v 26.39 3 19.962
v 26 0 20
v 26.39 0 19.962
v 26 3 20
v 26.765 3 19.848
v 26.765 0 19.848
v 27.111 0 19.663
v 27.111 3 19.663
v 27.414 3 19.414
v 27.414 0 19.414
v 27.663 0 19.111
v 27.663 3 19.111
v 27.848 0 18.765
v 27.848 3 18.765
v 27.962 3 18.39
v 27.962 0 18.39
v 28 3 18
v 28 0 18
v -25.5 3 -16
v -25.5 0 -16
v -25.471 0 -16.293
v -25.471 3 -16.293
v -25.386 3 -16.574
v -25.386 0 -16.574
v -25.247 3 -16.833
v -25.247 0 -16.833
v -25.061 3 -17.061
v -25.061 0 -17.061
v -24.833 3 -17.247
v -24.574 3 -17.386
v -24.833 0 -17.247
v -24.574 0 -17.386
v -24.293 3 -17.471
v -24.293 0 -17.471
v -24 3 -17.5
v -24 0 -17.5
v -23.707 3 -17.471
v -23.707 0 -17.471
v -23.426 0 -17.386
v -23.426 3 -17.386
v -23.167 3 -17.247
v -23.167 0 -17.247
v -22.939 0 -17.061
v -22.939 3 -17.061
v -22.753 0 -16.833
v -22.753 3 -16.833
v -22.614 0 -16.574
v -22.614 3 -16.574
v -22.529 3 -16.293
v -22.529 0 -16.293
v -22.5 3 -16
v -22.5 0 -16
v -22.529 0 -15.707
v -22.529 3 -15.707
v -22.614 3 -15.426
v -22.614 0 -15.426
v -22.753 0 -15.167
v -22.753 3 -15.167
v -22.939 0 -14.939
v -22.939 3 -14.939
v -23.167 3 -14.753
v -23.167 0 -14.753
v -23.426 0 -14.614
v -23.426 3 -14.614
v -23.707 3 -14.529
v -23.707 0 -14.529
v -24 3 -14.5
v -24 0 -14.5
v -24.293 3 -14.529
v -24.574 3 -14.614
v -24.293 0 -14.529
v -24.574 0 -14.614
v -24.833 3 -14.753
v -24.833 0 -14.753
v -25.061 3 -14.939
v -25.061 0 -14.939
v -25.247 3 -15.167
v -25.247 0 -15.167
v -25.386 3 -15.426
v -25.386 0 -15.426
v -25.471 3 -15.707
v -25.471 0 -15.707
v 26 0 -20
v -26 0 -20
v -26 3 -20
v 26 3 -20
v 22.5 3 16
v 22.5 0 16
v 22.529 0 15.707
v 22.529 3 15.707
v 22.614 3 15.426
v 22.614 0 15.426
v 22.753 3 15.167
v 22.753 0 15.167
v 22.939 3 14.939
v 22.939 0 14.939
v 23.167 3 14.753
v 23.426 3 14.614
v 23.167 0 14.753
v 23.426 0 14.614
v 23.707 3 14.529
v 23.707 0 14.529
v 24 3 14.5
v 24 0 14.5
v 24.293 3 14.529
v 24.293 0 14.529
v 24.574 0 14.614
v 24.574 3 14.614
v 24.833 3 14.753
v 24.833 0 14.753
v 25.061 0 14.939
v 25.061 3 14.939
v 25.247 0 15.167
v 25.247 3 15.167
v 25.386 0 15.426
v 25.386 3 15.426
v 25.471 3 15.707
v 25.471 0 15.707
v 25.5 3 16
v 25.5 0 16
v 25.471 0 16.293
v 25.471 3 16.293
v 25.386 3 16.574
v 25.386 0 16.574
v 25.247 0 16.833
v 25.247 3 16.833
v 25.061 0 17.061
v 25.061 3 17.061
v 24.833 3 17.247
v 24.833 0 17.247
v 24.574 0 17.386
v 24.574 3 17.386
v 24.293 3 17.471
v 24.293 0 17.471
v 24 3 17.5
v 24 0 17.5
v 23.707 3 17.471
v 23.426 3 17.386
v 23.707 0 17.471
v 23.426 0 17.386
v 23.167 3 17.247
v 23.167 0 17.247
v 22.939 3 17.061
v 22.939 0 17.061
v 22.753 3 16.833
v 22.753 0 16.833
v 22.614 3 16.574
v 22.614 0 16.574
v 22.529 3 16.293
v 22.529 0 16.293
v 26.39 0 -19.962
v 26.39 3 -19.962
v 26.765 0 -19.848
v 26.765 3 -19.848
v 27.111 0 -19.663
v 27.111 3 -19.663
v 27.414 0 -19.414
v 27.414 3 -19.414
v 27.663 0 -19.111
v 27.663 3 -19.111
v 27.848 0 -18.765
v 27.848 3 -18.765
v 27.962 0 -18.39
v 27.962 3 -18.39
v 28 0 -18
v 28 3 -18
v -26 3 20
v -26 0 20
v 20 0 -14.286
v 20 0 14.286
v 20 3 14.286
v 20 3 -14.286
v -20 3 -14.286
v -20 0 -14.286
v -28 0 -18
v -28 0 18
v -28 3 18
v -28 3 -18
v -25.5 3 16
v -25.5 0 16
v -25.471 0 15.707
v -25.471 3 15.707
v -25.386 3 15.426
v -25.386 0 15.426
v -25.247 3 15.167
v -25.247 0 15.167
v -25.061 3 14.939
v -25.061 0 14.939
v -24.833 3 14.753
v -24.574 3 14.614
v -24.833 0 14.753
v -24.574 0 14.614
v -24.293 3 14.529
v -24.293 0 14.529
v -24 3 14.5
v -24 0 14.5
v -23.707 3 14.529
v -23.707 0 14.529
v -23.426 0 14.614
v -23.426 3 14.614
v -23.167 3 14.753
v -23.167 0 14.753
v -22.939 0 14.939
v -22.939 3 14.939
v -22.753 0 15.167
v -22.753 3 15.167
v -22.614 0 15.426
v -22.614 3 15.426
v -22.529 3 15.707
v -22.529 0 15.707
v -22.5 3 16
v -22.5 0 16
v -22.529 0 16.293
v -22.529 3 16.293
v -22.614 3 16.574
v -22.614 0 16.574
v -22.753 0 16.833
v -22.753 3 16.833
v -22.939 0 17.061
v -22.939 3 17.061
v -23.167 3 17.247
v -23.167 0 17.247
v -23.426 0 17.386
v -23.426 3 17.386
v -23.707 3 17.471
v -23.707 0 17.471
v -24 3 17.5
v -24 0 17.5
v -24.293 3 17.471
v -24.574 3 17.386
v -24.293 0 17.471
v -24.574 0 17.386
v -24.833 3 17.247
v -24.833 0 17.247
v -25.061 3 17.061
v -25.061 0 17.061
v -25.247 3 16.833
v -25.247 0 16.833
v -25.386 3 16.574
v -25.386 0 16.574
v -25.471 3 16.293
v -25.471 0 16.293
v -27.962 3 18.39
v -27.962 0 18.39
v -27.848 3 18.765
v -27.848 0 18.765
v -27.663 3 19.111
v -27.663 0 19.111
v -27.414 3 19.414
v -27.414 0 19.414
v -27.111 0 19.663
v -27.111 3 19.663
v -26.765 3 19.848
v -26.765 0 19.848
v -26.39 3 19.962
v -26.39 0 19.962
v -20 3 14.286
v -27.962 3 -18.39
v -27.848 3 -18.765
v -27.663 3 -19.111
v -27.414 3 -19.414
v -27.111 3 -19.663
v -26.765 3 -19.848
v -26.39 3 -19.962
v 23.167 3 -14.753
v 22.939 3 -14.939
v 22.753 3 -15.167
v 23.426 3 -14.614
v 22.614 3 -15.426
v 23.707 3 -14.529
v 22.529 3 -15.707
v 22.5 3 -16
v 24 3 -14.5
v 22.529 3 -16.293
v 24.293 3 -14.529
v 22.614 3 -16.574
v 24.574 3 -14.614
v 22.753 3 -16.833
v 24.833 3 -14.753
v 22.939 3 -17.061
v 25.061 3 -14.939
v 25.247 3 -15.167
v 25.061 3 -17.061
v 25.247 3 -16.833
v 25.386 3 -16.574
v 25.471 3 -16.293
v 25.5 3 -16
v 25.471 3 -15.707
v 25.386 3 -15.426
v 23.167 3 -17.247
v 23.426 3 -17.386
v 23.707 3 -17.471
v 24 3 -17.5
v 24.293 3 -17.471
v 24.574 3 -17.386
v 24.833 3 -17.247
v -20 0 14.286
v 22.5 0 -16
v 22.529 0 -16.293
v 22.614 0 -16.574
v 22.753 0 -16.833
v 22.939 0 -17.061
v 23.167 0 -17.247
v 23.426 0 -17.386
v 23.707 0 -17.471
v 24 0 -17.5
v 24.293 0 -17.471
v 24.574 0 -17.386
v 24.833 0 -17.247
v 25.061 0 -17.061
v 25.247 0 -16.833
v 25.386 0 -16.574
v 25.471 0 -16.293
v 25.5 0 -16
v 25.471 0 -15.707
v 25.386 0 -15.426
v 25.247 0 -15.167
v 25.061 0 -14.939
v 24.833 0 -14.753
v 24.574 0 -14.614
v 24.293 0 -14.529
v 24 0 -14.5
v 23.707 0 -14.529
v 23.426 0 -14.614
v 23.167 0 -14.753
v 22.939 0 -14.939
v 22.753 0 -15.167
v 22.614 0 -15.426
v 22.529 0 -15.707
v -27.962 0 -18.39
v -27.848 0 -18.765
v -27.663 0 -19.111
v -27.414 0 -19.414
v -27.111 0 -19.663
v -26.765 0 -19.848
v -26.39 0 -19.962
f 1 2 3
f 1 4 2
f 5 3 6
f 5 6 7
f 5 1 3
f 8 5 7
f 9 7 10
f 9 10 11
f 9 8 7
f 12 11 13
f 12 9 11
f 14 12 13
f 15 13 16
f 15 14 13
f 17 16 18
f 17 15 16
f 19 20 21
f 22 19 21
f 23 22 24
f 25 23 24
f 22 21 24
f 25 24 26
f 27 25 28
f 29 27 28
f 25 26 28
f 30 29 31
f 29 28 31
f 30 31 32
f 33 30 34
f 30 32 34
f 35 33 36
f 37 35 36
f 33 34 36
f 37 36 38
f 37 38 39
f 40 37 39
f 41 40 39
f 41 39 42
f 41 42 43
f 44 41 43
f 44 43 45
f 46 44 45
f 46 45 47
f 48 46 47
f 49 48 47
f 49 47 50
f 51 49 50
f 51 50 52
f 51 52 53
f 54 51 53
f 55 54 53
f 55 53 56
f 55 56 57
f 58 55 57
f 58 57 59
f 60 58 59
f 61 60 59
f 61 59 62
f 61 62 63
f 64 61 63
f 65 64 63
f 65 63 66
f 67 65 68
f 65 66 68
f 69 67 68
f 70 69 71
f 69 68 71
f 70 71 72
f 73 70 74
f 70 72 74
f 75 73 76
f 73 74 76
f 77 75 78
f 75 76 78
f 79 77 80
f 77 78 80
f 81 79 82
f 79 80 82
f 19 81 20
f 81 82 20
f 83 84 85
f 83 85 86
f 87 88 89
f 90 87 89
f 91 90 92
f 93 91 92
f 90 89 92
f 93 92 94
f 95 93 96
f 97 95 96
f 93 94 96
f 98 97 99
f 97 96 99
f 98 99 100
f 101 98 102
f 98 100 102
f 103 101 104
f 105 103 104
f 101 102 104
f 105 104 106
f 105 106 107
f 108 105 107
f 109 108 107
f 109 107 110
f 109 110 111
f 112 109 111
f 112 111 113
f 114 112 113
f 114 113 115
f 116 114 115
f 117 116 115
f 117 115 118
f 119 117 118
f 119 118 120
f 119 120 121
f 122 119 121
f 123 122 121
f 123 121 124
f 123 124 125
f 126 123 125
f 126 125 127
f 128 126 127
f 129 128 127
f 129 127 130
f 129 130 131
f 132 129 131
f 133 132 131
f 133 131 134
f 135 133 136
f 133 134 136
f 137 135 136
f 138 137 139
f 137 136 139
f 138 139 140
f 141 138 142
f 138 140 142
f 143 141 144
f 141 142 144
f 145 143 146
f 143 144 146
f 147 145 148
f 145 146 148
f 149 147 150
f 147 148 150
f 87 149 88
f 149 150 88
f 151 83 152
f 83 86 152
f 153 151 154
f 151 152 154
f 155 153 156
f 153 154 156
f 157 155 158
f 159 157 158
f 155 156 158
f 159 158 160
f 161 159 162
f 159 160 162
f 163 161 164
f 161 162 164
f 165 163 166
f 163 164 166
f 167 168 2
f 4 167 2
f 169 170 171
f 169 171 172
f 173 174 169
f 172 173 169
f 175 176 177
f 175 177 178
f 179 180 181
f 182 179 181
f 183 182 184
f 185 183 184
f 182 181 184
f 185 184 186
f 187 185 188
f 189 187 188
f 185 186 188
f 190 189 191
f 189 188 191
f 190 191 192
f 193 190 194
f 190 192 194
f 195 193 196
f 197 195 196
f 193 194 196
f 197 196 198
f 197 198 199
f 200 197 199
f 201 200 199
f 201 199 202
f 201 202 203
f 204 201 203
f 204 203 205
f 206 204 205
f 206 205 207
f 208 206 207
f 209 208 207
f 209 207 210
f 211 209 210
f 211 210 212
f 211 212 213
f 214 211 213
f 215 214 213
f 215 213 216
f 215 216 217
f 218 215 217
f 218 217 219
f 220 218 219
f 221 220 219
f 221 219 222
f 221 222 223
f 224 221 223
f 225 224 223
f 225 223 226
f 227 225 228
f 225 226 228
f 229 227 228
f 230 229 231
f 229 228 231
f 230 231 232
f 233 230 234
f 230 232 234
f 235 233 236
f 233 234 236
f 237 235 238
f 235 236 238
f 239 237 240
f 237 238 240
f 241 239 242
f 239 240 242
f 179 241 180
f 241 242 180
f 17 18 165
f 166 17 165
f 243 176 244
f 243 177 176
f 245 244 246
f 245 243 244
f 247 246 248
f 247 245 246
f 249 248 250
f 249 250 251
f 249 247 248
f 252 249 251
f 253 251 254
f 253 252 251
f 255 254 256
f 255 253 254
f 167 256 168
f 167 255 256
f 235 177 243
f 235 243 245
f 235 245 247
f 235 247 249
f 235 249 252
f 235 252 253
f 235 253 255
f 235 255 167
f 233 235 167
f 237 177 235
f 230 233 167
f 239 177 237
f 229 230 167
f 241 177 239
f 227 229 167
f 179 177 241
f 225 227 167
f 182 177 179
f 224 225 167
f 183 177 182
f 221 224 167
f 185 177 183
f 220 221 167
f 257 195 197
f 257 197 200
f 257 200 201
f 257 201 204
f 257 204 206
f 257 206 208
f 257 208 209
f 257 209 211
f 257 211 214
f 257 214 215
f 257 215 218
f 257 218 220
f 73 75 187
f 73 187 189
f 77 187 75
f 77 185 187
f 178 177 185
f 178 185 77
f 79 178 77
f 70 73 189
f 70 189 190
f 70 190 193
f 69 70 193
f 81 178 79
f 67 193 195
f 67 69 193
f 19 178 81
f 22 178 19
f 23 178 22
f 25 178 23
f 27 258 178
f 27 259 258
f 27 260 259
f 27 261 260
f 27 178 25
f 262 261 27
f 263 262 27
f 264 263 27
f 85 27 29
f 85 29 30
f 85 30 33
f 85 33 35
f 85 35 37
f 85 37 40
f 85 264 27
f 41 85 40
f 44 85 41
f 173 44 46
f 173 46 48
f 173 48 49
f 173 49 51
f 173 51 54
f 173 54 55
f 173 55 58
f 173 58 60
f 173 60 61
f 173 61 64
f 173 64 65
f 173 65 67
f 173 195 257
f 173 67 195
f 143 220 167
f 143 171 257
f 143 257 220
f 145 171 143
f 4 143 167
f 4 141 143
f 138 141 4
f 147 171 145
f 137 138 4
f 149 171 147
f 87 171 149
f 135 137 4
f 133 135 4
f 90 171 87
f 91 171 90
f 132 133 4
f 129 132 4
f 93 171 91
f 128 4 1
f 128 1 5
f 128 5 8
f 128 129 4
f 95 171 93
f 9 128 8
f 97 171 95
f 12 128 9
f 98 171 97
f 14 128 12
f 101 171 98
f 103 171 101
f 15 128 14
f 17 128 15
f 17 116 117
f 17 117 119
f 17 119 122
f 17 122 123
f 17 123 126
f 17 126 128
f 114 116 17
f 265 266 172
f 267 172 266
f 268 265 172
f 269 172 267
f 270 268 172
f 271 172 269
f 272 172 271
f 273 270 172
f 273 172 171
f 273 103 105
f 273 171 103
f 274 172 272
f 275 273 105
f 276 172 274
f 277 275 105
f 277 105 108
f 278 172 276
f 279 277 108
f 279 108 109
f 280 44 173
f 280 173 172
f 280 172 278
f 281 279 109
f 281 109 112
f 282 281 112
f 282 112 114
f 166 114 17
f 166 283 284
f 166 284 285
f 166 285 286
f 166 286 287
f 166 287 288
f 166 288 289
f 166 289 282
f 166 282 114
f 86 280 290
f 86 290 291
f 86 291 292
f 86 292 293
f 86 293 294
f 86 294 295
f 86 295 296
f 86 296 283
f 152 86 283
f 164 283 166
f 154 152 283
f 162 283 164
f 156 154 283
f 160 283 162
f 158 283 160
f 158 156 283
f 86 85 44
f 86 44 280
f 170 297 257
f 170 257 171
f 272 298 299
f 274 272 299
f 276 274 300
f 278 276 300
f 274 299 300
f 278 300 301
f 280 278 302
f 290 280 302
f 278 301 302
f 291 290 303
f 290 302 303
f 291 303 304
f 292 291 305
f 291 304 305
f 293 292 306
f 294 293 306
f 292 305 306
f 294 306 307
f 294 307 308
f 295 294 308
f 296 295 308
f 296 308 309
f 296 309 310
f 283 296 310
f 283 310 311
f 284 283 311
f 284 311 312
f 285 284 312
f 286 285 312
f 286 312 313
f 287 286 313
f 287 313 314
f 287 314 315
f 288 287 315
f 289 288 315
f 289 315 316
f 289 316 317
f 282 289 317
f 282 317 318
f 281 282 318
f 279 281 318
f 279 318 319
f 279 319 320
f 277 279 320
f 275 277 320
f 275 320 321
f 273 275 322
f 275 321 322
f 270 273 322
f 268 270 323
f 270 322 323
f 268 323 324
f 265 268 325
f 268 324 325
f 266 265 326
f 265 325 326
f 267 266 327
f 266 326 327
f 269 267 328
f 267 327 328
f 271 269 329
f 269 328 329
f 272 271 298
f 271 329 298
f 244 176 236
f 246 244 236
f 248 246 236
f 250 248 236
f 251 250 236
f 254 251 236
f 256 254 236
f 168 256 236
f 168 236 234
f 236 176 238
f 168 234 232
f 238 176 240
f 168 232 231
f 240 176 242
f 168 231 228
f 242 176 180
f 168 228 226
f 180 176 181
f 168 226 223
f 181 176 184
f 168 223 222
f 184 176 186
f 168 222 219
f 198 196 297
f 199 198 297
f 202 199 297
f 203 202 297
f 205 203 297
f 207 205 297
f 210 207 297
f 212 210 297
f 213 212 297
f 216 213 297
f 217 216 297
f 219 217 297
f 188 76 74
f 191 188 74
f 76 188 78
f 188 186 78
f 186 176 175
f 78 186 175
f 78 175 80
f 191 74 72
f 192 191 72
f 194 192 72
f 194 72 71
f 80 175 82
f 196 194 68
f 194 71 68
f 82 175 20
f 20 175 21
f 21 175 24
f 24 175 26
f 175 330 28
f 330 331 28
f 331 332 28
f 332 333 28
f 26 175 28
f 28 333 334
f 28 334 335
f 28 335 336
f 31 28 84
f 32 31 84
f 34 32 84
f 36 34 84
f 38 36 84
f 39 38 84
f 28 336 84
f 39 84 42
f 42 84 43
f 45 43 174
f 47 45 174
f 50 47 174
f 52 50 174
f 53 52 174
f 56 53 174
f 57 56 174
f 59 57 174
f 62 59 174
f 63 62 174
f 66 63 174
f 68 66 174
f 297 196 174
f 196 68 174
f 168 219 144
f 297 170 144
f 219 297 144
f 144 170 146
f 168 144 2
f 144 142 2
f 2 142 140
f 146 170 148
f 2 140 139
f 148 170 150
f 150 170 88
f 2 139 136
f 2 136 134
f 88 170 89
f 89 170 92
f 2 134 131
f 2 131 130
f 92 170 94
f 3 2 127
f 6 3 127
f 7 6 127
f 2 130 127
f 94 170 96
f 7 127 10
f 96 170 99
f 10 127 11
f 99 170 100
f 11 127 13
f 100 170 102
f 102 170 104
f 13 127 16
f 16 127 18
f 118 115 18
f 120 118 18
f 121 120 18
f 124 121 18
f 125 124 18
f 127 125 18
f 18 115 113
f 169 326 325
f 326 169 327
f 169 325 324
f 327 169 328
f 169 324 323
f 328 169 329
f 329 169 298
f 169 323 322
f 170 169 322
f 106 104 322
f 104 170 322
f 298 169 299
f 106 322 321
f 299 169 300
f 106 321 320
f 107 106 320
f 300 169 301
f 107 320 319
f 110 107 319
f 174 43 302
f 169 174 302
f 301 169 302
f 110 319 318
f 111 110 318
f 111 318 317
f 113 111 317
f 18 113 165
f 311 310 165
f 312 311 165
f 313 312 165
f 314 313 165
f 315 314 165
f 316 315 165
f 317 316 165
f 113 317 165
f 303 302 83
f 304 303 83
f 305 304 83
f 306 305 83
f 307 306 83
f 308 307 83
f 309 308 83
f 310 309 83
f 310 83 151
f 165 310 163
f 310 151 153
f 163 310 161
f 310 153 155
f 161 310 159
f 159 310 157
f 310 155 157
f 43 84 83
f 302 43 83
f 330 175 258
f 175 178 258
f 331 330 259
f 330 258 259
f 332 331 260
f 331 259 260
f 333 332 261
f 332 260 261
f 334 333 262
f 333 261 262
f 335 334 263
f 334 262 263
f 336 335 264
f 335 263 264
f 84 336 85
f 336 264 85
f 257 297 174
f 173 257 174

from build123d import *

# Parameters (mm, degrees)
SKETCH2_W           = 56
SKETCH2_H           = 40
SKETCH2_W_2         = 40
SKETCH2_H_2         = 28.571428572
BOSS_EXTRUDE2_DEPTH = 3
SKETCH3_R           = 1.5
CUT_EXTRUDE1_DEPTH  = 4
FILLET1_R           = 2


with BuildPart() as part:
    # Sketch2 → Boss-Extrude2 (new body)
    with BuildSketch(Plane(origin=(0, 0, 0), x_dir=(1, 0, 0), z_dir=(0, 1, 0))):
        Rectangle(SKETCH2_W, SKETCH2_H)
        Rectangle(SKETCH2_W_2, SKETCH2_H_2, mode=Mode.SUBTRACT)
    extrude(amount=BOSS_EXTRUDE2_DEPTH)

    # Sketch3 → Cut-Extrude1 (cut, through all)
    with BuildSketch(Plane(origin=(0, 0, 0), x_dir=(-1, 0, 0), z_dir=(0, -1, 0))):
        with Locations((24, -16)):
            Circle(SKETCH3_R)
        with Locations((-24, 16)):
            Circle(SKETCH3_R)
        with Locations((-24, -16)):
            Circle(SKETCH3_R)
        with Locations((24, 16)):
            Circle(SKETCH3_R)
    extrude(amount=-CUT_EXTRUDE1_DEPTH, mode=Mode.SUBTRACT)

    # Fillet1
    fillet1_edges = [part.edges().sort_by_distance(p)[0] for p in [
        (28, 1.5, 20),
        (-28, 1.5, 20),
        (-28, 1.5, -20),
        (28, 1.5, -20),
    ]]
    fillet(fillet1_edges, radius=FILLET1_R)


solid = part.part
